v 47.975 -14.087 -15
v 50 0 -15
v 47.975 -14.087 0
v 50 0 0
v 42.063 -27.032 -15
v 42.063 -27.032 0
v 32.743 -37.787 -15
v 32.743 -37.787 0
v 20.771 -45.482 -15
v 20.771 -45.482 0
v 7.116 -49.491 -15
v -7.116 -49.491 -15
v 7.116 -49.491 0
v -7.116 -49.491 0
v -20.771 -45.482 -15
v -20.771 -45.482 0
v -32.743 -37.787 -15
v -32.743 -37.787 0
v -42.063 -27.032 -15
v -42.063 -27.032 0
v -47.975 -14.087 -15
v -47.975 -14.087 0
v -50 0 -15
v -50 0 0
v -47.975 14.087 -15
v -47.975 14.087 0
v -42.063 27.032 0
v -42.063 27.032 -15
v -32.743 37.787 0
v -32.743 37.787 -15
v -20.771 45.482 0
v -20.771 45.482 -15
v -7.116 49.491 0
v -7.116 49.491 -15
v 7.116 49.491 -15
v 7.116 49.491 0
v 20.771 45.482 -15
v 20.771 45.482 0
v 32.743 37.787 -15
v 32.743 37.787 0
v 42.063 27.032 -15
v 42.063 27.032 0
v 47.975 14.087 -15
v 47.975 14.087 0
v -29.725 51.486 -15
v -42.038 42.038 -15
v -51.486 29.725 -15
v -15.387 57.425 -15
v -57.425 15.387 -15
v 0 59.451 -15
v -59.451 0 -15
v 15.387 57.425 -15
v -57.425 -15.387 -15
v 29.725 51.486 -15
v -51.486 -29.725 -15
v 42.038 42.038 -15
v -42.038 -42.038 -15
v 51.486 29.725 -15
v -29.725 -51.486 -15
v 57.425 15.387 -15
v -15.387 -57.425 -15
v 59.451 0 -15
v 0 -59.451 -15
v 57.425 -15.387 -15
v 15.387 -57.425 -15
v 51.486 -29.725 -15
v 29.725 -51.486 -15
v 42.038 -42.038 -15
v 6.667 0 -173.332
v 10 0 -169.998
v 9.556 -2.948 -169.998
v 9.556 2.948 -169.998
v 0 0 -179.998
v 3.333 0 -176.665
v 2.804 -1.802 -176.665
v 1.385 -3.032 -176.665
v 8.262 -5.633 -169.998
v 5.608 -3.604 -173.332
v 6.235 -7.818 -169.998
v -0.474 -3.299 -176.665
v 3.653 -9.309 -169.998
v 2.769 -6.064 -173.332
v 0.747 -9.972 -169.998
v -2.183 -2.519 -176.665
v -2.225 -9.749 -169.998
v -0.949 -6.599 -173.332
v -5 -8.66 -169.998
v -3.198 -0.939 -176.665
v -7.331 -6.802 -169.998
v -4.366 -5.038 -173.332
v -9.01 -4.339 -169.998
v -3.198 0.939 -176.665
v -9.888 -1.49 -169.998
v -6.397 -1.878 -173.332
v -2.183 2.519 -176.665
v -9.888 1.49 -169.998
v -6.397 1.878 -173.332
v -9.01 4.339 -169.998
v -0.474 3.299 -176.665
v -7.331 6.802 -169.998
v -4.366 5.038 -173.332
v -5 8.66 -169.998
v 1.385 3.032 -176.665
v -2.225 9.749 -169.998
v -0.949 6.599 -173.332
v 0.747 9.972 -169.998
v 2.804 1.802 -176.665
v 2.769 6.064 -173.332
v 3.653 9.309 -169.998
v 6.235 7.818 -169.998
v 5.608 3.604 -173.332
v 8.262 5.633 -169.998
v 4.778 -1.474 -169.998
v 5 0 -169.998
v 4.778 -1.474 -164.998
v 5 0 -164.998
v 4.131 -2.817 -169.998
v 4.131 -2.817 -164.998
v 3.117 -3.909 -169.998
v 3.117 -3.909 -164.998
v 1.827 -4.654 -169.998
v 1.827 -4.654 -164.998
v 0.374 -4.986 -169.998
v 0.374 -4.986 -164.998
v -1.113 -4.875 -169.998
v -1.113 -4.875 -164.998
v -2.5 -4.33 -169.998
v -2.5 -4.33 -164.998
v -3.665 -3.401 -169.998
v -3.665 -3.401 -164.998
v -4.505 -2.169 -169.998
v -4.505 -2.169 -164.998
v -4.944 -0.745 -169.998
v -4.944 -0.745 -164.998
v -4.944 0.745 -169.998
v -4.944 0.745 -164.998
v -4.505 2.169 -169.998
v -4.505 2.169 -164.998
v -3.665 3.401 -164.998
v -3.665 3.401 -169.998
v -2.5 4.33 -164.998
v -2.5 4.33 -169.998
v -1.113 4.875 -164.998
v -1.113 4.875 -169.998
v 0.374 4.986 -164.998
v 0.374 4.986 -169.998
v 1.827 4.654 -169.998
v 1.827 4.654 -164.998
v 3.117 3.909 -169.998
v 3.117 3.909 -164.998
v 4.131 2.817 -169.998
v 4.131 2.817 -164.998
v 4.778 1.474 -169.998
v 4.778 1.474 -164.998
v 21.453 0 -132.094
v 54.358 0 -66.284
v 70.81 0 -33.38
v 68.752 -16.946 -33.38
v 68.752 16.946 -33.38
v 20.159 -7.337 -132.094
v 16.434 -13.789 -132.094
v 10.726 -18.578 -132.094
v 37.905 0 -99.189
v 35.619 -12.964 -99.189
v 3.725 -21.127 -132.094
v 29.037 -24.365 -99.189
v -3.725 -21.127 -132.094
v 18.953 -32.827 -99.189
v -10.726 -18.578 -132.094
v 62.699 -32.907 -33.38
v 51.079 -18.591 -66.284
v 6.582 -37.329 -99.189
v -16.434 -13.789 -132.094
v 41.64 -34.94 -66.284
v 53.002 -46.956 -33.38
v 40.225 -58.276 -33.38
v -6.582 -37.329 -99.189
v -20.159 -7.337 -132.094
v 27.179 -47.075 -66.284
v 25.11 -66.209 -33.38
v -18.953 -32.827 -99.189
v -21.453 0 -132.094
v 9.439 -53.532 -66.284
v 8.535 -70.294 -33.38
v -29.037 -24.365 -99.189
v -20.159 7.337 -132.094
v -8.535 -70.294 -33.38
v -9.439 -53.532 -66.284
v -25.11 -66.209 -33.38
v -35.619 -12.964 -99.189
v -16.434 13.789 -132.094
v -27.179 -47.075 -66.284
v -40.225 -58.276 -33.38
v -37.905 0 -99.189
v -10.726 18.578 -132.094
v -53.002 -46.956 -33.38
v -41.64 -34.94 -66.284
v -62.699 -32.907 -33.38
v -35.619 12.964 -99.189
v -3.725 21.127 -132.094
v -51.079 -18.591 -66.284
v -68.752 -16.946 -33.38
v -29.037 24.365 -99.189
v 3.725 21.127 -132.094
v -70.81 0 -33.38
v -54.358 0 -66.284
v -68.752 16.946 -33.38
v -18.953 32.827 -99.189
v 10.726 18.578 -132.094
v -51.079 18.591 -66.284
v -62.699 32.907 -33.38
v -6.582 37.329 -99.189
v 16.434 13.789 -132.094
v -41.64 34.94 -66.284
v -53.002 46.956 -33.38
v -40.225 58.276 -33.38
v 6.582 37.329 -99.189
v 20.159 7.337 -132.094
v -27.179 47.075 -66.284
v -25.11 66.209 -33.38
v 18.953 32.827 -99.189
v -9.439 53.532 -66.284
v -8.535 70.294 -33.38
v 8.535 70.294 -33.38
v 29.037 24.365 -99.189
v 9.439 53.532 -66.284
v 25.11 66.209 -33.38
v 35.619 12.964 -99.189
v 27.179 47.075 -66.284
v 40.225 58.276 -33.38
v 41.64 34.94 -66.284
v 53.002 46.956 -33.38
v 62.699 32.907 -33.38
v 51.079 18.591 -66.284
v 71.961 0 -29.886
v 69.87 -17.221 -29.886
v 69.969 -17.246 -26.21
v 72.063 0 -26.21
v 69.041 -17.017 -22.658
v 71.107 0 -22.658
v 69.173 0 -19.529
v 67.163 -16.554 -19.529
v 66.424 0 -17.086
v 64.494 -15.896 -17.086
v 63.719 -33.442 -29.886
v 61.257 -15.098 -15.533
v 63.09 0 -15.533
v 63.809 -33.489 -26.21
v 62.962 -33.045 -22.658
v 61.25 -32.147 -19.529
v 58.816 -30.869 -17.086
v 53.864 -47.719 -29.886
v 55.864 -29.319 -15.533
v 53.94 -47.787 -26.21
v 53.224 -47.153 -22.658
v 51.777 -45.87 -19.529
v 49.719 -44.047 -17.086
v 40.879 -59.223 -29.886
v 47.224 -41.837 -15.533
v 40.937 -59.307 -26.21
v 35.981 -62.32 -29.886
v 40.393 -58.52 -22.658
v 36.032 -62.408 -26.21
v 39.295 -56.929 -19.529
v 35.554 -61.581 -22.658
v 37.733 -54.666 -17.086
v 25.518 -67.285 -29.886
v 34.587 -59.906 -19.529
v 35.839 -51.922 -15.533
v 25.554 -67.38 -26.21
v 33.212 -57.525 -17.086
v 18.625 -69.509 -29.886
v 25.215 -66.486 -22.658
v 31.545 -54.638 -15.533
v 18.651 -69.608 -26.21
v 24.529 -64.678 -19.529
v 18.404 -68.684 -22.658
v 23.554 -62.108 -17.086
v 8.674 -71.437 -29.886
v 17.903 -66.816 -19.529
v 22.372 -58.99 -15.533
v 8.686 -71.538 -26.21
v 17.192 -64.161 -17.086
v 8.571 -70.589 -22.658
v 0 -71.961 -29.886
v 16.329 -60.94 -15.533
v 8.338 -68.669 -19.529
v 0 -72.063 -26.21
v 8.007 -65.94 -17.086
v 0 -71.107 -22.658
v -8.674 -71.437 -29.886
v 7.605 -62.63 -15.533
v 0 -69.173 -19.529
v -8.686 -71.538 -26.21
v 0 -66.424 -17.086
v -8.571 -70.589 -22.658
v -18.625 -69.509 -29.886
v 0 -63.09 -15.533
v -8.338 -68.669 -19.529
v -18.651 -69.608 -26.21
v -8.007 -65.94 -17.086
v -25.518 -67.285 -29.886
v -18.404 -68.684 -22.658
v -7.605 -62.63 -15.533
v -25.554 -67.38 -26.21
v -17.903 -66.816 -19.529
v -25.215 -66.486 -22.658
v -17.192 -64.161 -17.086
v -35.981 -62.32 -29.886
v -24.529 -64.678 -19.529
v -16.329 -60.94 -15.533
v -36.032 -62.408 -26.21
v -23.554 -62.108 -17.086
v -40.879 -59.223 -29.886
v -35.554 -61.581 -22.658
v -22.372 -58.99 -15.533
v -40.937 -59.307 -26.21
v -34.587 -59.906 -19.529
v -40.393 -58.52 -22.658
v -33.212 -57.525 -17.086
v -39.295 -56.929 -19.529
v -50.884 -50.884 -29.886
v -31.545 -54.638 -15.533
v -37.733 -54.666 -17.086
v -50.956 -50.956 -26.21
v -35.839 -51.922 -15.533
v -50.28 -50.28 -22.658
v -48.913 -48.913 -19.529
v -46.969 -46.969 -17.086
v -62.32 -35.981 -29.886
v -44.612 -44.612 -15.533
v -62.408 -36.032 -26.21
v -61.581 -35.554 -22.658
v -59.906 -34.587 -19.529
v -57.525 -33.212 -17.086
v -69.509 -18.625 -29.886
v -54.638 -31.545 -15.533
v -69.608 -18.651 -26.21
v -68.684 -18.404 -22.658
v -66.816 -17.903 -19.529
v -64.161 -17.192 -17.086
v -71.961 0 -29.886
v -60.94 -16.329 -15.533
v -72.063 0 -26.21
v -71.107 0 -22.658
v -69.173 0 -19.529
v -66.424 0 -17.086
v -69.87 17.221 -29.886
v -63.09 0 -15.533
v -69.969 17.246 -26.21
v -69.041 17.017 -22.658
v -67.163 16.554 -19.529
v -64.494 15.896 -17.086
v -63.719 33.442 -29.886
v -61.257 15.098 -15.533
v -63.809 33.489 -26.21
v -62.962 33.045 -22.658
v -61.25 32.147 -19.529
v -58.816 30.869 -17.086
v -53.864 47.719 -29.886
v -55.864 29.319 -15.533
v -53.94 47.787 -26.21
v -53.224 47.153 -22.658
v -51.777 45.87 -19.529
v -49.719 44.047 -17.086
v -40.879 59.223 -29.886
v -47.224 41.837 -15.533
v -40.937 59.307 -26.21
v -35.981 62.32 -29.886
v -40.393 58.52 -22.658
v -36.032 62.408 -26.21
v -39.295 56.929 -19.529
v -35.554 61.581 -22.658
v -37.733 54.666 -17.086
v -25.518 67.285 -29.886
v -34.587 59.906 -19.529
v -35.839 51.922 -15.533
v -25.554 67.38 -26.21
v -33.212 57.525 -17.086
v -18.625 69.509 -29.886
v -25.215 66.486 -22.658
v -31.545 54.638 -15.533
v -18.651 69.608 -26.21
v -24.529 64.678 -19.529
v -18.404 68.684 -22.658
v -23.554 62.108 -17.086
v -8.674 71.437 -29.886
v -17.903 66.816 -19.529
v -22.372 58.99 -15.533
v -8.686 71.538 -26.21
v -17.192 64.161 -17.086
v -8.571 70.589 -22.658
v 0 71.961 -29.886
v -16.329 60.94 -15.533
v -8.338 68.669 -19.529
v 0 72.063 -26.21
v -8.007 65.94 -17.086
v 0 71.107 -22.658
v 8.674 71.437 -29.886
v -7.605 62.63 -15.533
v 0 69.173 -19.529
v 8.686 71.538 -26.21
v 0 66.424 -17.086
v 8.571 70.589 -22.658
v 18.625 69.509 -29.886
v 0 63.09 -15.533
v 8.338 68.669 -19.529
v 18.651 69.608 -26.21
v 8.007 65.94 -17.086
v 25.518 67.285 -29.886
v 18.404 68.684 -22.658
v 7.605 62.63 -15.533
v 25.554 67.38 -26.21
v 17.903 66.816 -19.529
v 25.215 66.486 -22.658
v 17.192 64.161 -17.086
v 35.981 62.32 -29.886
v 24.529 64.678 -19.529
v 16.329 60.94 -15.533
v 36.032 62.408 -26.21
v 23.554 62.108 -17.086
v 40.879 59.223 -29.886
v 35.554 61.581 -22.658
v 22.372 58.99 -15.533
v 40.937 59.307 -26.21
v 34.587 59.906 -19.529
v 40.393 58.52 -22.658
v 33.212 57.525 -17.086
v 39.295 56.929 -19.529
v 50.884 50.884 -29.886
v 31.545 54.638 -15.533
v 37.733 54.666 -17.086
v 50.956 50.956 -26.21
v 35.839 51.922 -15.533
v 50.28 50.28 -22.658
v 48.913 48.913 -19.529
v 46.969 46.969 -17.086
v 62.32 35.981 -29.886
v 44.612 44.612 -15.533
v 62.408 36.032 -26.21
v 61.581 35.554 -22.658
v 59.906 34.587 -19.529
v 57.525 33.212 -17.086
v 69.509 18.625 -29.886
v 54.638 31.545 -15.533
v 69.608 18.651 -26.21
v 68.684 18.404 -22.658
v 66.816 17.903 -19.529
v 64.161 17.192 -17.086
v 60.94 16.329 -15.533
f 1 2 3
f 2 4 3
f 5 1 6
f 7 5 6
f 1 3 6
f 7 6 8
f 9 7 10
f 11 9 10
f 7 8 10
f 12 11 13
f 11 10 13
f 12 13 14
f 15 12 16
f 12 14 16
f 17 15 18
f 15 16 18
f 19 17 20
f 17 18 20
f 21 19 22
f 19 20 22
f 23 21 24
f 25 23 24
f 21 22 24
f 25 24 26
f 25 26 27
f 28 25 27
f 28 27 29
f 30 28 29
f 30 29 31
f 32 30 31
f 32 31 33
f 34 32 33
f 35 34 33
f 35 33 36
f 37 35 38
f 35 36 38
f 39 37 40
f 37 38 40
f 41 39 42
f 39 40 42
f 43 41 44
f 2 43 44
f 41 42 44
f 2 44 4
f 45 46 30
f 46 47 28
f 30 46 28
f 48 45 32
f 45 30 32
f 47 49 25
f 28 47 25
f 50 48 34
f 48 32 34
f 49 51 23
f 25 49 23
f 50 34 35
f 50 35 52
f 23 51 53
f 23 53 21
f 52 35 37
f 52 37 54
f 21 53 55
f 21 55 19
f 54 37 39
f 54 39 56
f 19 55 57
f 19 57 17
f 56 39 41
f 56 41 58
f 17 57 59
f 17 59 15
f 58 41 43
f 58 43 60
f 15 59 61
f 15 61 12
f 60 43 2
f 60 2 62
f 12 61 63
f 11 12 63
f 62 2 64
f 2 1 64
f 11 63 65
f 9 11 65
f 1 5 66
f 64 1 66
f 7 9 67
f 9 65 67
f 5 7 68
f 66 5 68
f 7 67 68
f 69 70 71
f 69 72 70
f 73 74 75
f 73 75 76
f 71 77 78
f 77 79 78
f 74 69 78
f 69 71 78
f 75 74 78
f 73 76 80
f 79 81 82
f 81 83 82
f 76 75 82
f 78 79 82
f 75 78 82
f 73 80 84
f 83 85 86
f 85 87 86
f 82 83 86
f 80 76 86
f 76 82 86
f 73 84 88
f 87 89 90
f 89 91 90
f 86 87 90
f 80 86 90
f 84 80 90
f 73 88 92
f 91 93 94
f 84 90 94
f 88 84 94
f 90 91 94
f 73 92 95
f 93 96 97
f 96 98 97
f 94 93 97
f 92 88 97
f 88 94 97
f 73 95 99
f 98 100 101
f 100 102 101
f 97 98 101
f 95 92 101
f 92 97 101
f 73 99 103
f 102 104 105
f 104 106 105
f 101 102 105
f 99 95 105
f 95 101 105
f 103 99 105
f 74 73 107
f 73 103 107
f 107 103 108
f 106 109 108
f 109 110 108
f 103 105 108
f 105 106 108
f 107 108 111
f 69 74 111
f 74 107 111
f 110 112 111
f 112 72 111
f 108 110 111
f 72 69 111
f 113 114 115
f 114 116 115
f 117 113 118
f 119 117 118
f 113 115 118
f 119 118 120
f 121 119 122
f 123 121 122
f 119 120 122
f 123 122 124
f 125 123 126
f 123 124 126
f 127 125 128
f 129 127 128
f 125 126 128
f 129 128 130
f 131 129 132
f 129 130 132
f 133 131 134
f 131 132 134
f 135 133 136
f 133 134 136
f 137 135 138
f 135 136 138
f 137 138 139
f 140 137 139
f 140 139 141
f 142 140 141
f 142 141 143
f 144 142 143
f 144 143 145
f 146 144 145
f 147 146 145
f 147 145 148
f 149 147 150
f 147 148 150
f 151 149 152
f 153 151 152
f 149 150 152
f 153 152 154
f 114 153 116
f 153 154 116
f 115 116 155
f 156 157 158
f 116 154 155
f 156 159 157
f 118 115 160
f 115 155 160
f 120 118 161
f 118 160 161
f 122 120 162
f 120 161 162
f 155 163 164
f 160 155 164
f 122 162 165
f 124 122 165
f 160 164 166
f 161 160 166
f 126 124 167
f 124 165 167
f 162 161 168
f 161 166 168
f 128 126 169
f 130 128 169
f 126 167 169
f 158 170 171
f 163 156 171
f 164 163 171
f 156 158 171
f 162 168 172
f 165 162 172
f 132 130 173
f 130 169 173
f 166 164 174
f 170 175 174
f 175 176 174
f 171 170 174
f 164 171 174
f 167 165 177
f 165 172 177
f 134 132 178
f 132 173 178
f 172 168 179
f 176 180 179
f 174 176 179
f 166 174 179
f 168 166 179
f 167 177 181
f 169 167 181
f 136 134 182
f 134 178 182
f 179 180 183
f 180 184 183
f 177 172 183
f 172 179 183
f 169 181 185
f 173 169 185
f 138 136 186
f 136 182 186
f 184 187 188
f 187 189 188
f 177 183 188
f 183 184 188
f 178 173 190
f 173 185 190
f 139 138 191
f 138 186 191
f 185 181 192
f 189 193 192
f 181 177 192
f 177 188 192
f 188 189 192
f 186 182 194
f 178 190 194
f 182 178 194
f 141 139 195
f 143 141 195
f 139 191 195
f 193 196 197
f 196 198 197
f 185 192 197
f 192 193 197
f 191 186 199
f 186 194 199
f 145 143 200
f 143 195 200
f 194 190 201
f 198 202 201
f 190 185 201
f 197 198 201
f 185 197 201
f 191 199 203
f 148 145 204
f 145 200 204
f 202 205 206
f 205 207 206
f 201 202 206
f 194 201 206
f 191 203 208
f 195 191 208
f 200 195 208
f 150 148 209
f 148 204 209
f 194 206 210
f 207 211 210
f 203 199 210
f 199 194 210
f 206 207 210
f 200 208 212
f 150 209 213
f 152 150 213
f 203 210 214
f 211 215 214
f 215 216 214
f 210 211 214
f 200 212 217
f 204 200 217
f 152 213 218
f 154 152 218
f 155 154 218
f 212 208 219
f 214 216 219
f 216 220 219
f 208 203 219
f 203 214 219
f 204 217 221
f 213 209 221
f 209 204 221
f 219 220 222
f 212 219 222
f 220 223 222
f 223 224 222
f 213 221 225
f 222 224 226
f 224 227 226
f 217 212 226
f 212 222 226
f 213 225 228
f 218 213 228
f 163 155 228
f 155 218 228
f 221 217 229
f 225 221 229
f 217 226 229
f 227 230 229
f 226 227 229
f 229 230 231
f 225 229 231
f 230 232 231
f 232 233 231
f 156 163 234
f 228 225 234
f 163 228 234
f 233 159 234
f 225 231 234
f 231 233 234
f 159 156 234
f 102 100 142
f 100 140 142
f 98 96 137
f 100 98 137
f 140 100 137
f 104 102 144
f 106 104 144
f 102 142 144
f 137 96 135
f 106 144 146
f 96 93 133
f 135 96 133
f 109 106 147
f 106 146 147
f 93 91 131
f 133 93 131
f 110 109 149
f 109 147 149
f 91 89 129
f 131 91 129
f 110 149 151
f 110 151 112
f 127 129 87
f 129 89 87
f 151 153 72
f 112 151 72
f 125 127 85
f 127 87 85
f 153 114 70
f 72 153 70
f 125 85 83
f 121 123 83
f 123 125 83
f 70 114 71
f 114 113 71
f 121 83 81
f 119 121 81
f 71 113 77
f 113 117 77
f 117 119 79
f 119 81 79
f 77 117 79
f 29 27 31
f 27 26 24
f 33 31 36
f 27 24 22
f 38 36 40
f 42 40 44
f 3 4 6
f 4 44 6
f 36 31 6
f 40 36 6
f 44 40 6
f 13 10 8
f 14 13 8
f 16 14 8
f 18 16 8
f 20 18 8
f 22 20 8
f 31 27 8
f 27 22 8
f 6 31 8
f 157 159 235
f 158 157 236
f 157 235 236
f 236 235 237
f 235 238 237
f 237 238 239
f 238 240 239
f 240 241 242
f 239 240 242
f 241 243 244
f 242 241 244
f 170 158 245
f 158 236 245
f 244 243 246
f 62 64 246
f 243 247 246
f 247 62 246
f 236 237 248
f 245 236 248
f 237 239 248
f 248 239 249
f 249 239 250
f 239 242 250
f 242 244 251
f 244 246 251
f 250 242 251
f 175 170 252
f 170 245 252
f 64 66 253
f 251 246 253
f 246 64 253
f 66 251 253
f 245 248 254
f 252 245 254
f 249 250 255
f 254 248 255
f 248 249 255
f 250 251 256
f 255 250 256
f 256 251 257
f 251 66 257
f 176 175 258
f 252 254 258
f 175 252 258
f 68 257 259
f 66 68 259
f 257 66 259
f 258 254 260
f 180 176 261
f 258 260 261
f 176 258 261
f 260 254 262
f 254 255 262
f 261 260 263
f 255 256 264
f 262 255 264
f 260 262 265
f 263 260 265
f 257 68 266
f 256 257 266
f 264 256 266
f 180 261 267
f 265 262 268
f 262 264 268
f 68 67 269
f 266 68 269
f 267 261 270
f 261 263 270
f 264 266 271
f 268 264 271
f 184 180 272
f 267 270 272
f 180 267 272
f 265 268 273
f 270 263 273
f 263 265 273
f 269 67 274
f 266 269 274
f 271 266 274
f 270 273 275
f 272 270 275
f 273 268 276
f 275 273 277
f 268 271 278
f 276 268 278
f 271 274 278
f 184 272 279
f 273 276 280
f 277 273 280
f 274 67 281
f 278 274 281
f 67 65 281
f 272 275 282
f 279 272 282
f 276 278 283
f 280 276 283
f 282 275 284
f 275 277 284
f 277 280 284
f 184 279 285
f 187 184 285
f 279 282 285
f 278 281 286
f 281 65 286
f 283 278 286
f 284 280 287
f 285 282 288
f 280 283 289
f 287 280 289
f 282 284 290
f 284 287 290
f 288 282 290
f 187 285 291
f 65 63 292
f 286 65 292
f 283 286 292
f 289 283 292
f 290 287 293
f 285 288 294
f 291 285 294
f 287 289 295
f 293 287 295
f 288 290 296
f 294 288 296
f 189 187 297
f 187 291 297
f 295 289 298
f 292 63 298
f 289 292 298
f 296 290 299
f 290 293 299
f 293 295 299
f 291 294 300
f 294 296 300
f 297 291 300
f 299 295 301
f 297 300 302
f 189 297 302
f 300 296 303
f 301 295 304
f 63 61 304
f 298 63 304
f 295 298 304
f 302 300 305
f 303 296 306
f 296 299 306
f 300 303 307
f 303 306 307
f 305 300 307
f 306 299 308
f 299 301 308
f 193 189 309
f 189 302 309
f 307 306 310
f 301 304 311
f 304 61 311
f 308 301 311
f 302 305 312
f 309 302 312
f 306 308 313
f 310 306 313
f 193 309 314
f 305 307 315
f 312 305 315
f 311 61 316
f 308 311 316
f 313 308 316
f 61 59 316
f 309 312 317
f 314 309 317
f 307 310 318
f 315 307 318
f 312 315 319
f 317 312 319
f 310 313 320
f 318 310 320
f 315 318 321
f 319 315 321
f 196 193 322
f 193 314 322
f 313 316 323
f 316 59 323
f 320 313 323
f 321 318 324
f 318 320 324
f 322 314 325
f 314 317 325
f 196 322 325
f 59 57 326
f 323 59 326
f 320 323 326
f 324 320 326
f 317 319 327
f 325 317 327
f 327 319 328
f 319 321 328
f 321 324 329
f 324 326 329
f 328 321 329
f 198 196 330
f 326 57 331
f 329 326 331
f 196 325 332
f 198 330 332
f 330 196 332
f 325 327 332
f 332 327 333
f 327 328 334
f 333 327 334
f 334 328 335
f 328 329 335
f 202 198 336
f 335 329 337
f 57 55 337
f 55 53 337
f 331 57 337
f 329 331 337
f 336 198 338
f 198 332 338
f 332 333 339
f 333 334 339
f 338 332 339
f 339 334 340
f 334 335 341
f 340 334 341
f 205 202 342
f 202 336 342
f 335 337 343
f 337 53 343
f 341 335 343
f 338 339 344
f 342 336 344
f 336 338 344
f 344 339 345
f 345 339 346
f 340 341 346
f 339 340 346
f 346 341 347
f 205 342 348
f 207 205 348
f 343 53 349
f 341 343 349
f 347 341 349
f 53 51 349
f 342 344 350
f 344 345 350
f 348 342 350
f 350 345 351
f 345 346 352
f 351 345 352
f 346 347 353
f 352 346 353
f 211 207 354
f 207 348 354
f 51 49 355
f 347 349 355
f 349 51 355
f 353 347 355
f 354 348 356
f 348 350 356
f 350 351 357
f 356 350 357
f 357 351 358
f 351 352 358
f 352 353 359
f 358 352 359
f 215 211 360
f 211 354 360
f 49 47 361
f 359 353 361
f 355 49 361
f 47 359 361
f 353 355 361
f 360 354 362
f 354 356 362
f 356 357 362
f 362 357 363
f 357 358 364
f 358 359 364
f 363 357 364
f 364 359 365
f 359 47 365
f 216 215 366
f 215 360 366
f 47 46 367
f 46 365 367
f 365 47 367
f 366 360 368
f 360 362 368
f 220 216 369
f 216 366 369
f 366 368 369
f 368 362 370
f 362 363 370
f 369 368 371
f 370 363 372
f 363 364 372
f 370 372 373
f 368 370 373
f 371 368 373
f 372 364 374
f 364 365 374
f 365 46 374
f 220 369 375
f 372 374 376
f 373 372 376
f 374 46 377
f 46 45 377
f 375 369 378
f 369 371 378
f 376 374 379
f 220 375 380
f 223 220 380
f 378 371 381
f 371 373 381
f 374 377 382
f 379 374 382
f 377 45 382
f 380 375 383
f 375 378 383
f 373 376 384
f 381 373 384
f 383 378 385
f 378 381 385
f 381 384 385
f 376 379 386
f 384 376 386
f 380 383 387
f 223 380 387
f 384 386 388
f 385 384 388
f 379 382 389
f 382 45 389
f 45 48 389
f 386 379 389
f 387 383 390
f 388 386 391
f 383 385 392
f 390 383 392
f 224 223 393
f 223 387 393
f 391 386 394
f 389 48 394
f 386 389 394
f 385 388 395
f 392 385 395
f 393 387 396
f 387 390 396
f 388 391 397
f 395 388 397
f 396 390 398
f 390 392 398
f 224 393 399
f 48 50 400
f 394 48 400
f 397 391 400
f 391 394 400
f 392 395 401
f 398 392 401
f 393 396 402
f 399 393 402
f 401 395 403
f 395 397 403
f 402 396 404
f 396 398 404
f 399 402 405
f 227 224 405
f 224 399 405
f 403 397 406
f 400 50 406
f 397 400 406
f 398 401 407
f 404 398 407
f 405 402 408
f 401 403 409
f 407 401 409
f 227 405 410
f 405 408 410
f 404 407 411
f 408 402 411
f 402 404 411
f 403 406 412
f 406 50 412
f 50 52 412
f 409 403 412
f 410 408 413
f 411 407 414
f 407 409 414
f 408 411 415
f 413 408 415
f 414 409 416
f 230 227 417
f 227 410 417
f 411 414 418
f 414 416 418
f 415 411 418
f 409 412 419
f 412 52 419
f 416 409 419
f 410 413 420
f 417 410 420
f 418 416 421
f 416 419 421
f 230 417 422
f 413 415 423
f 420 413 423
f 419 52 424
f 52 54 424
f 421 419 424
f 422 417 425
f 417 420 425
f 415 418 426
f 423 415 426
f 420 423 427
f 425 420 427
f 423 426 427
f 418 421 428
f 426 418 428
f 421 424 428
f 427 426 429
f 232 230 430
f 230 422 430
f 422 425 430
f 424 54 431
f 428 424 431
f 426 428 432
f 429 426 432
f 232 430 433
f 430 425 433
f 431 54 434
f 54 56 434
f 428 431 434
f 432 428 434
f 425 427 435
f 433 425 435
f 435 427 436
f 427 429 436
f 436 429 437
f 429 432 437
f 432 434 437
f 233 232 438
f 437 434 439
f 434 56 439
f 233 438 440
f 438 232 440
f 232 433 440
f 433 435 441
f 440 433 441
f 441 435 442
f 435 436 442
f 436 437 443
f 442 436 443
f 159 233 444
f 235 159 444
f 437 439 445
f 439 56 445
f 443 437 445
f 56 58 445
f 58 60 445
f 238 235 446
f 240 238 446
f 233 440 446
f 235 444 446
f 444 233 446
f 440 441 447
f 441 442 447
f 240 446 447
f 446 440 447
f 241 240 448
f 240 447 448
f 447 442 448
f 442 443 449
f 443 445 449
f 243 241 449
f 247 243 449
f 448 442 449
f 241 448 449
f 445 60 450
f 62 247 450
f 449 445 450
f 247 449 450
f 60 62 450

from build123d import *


with BuildPart() as f1:
    # F0 (on Front) → F1 (revolve)
    with BuildSketch(Plane.XZ):
        with BuildLine():
            Line((50, -15), (50, 0))
            Line((50, 0), (0, 0))
            Line((0, 0), (0, -179.9984))
            Line((0, -179.9984), (10, -169.9984))
            Line((10, -169.9984), (5, -169.9984))
            Line((5, -169.9984), (5, -164.9984))
            Line((5, -164.9984), (70.810071, -33.379661))
            ThreePointArc((70.810071, -33.379661), (70.25415, -21.023238), (59.45087, -15))
            Line((59.45087, -15), (50, -15))
        make_face()
    revolve(axis=Axis((0, 0, -89.9992), (0, 0, -1)))


solid = f1.part
